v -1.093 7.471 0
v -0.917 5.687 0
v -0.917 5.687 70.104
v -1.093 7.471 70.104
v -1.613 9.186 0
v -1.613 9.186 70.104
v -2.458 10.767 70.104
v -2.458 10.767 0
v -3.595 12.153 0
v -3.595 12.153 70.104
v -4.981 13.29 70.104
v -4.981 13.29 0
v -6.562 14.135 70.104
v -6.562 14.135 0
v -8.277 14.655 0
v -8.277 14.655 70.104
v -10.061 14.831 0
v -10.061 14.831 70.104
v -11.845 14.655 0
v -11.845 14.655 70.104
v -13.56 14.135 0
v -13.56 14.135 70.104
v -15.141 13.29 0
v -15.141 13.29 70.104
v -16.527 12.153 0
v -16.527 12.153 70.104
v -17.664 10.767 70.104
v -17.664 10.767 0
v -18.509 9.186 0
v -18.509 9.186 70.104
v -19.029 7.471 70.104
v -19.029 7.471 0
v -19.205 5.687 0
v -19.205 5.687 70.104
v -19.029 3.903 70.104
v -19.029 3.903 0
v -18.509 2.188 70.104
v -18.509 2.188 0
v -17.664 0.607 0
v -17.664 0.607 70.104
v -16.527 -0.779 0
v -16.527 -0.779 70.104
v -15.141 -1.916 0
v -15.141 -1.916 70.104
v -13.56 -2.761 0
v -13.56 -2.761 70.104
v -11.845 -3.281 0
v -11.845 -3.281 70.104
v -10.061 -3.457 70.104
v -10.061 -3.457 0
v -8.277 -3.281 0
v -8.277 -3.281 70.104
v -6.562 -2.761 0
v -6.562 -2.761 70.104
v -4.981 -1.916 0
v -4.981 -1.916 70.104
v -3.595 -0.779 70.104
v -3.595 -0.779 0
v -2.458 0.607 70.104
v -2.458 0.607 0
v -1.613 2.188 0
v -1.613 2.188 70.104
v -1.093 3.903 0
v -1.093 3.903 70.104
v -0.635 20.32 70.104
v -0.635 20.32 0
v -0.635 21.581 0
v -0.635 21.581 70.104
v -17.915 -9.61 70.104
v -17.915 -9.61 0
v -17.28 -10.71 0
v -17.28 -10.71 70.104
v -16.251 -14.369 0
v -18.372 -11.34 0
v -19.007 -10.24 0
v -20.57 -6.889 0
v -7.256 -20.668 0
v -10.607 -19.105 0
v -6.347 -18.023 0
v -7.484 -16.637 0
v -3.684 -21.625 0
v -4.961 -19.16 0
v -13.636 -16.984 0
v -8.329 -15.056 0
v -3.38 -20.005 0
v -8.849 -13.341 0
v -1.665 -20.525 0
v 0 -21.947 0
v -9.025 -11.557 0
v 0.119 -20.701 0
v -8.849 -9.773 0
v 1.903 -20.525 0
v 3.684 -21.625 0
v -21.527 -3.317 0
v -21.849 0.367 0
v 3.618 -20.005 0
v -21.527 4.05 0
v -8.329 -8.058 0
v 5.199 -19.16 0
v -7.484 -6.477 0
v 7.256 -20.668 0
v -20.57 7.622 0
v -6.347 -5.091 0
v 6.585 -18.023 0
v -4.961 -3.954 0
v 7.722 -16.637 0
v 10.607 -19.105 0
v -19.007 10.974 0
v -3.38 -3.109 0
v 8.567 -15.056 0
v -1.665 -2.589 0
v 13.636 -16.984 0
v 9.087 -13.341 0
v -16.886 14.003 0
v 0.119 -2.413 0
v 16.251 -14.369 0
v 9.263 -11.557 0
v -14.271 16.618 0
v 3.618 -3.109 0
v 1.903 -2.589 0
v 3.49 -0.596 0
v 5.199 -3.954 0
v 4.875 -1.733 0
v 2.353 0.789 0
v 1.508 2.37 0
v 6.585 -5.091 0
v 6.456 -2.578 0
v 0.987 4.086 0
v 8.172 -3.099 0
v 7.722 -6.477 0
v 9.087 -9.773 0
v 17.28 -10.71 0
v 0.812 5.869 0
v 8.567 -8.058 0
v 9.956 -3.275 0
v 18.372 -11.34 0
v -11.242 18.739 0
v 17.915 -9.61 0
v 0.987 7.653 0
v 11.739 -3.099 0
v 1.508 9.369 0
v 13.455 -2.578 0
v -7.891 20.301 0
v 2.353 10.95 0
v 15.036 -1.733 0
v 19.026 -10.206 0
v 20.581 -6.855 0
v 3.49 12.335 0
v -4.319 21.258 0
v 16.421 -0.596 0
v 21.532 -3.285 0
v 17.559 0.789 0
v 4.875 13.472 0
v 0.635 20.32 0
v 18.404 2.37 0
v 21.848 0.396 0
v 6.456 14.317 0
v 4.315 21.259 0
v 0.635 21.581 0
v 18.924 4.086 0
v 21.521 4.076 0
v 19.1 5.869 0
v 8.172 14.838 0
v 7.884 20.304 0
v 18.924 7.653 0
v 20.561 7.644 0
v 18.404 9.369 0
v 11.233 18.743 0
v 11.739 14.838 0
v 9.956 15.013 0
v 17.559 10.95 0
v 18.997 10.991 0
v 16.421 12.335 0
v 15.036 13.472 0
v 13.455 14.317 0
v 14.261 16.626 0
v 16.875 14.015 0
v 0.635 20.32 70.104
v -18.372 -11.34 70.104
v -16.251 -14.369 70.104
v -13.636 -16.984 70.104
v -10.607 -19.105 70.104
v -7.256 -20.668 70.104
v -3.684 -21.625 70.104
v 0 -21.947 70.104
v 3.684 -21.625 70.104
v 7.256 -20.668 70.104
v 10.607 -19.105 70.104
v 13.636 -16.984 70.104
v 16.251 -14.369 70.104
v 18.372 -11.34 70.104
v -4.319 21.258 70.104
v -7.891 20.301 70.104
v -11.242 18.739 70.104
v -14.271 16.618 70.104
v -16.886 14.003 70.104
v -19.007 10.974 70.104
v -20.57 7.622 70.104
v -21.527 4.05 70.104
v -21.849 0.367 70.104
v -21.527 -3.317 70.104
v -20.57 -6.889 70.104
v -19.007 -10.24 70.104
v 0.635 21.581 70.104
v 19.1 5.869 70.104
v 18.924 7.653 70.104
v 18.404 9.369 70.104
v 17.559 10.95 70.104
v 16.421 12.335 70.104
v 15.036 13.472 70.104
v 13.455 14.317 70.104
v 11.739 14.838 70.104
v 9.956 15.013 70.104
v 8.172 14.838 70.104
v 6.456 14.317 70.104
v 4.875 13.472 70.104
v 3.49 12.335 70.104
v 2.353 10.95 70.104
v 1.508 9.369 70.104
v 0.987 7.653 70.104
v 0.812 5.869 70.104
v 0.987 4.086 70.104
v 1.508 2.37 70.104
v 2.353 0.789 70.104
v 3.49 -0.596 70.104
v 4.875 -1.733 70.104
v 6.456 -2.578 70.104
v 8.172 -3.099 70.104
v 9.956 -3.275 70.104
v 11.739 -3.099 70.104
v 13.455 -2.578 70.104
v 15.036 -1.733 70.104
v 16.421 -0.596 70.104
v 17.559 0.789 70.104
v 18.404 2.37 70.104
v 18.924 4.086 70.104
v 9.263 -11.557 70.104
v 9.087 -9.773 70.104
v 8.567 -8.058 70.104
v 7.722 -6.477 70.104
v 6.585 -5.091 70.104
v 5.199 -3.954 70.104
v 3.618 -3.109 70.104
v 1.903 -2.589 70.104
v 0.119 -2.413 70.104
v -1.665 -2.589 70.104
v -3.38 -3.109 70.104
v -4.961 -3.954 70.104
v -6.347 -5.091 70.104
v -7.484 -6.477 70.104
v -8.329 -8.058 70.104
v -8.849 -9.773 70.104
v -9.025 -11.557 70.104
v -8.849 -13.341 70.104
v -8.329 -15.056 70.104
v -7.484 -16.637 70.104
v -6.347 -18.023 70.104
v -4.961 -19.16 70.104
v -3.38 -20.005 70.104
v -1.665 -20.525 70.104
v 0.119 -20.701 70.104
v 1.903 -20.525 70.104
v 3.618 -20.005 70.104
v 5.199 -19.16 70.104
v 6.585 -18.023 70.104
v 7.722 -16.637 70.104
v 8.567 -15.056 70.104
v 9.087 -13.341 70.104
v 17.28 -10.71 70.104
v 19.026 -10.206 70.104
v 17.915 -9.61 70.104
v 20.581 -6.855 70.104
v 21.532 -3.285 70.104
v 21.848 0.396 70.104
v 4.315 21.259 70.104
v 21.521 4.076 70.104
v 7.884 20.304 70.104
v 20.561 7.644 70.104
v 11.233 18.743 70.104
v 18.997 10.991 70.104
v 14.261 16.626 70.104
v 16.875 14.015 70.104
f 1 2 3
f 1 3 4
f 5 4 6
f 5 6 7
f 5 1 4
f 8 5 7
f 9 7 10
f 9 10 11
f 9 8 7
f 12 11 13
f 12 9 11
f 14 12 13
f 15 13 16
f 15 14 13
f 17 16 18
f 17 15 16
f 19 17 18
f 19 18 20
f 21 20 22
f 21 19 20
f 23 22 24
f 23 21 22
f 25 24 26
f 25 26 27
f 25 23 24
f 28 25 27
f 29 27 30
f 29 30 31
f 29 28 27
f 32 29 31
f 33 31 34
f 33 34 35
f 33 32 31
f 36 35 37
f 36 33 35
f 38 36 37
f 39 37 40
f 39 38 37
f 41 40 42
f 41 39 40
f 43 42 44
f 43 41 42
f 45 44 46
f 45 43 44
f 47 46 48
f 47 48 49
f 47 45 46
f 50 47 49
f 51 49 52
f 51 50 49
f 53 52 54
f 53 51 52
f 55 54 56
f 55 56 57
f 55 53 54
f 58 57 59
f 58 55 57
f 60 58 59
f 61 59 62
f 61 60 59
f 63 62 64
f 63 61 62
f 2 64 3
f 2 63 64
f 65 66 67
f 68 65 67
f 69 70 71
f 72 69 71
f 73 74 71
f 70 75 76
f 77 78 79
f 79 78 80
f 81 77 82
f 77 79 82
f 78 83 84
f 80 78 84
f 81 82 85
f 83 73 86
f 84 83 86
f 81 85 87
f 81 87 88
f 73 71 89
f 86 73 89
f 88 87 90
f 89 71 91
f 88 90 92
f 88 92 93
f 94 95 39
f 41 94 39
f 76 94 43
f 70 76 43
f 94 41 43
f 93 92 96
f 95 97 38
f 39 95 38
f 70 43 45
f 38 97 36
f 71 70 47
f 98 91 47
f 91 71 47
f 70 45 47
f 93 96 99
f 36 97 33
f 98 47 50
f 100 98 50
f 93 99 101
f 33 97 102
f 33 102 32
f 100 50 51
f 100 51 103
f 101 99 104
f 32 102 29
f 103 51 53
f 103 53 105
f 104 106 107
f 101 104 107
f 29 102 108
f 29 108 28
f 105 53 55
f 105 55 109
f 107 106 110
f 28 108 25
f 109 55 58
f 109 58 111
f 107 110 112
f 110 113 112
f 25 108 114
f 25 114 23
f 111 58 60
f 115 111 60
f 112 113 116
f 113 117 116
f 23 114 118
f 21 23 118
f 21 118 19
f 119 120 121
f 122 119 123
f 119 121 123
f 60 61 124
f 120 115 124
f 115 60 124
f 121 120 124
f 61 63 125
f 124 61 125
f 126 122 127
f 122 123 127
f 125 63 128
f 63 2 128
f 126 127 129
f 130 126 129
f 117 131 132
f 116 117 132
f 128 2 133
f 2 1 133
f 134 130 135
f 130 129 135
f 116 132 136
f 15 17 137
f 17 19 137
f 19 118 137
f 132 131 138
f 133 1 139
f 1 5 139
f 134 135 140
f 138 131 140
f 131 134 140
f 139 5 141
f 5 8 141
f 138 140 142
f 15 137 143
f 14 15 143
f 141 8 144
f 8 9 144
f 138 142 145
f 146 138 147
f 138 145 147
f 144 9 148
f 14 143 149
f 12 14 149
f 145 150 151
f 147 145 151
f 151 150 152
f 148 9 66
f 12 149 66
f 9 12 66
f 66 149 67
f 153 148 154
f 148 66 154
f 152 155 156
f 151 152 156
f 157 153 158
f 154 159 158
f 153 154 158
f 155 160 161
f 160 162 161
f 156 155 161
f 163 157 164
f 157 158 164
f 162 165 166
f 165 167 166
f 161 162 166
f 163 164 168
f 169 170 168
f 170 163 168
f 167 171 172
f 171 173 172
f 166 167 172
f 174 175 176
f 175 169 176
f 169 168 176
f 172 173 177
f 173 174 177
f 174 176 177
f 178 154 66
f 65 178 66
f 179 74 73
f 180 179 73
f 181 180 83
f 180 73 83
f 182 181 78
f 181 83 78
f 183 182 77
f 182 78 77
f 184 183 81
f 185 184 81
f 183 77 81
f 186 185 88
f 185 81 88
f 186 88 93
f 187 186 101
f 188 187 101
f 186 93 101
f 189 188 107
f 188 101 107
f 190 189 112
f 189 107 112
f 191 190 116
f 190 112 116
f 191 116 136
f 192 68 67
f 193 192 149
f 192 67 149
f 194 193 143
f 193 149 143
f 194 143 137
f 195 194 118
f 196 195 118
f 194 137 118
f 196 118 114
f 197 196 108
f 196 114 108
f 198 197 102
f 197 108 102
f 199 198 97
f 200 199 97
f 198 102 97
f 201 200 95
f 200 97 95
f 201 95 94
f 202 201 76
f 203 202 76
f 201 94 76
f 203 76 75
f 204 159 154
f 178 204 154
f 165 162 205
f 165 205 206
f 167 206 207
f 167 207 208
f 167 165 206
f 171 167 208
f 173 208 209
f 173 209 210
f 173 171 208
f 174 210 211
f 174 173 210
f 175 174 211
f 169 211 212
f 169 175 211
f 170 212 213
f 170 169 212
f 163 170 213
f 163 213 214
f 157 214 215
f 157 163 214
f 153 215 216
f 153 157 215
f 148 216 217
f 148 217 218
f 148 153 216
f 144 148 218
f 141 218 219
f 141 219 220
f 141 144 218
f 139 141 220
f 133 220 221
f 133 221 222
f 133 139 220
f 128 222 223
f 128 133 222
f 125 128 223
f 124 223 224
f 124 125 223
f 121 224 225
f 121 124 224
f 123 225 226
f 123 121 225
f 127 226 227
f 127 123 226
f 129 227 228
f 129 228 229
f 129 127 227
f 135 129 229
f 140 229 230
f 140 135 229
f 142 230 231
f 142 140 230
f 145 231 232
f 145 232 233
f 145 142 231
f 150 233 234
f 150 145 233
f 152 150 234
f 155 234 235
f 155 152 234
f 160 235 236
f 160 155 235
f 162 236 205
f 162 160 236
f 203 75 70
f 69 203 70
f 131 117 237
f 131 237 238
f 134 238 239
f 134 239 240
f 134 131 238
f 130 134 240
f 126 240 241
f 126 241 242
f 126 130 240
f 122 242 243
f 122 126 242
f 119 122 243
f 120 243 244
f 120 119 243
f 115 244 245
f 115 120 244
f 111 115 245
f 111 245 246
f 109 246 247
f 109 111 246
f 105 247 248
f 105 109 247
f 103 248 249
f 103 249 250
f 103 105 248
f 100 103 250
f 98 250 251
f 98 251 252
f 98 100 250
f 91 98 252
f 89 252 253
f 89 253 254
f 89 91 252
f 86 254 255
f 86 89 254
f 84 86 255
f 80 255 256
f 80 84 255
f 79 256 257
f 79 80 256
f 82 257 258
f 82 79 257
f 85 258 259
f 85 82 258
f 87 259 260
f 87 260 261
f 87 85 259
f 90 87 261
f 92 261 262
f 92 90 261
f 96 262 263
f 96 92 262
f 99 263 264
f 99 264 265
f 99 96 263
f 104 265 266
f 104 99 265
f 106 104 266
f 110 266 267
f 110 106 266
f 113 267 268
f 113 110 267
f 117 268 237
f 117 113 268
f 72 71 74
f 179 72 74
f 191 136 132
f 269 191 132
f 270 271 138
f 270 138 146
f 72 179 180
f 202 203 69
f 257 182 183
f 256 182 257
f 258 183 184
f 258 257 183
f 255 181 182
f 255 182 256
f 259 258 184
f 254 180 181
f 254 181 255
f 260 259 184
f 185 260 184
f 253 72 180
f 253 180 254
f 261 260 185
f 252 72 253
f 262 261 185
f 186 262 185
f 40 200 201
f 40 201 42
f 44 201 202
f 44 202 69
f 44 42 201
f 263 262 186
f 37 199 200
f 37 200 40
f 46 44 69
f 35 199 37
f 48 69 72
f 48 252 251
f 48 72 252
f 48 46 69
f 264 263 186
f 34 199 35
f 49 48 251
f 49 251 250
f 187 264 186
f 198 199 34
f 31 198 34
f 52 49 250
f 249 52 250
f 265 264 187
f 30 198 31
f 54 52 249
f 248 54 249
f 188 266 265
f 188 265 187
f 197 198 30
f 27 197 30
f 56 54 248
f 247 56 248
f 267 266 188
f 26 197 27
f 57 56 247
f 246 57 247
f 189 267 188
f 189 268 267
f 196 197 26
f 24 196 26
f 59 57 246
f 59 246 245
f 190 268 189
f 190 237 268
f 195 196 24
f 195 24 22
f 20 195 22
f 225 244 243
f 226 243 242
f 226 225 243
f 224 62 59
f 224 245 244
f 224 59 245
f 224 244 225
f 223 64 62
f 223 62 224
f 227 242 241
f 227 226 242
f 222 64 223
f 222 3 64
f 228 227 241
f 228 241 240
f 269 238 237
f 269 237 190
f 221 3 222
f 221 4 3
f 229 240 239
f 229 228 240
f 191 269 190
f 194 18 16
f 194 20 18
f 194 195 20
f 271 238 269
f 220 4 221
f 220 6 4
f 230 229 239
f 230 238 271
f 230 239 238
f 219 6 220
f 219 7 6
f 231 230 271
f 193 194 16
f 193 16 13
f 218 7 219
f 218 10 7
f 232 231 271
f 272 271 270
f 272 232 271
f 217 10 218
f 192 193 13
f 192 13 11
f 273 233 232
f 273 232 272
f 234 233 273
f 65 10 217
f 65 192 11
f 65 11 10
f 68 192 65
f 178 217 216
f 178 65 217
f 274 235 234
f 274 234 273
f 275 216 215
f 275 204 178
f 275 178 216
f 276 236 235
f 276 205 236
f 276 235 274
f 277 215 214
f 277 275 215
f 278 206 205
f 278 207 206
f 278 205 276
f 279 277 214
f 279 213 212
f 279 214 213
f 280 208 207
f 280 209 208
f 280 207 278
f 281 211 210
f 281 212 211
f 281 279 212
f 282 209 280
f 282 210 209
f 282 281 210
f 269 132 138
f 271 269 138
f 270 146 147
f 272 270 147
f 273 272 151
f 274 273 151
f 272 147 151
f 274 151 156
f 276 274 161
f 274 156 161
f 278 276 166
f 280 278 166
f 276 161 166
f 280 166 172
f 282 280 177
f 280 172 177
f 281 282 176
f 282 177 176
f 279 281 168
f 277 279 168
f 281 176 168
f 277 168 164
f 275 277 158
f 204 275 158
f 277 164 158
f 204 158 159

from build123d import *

# Parameters (mm, degrees)
SKETCH1_R           = 9.144
BOSS_EXTRUDE1_DEPTH = 70.104


with BuildPart() as part:
    # Sketch1 → Boss-Extrude1 (new body)
    with BuildSketch(Plane.XY):
        with BuildLine():
            Line((0, 20.32), (-0.635, 20.32))
            Line((-0.635, 20.32), (-0.635, 21.580659744))
            ThreePointArc((-0.635, 21.580659744), (-19.006899569, 10.973638583), (-19.006899569, -10.240403741))
            Line((-19.006899569, -10.240403741), (-17.915136205, -9.610073869))
            Line((-17.915136205, -9.610073869), (-17.597636205, -10.16))
            Line((-17.597636205, -10.16), (-17.280136205, -10.709926131))
            Line((-17.280136205, -10.709926131), (-18.371899569, -11.340256004))
            ThreePointArc((-18.371899569, -11.340256004), (0, -21.947277165), (18.371899569, -11.340256004))
            Line((18.371899569, -11.340256004), (17.280136205, -10.709926131))
            Line((17.280136205, -10.709926131), (17.597636205, -10.16))
            Line((17.597636205, -10.16), (17.915136205, -9.610073869))
            Line((17.915136205, -9.610073869), (19.025544668, -10.205721439))
            ThreePointArc((19.025544668, -10.205721439), (18.996550601, 10.990773387), (0.635, 21.580659744))
            Line((0.635, 21.580659744), (0.635, 20.32))
            Line((0.635, 20.32), (0, 20.32))
        make_face()
        with Locations((0.118855304, -11.557)):
            Circle(SKETCH1_R, mode=Mode.SUBTRACT)
        with Locations((9.955579479, 5.869470694)):
            Circle(SKETCH1_R, mode=Mode.SUBTRACT)
        with Locations((-10.060900468, 5.687049391)):
            Circle(SKETCH1_R, mode=Mode.SUBTRACT)
    extrude(amount=BOSS_EXTRUDE1_DEPTH)


solid = part.part
